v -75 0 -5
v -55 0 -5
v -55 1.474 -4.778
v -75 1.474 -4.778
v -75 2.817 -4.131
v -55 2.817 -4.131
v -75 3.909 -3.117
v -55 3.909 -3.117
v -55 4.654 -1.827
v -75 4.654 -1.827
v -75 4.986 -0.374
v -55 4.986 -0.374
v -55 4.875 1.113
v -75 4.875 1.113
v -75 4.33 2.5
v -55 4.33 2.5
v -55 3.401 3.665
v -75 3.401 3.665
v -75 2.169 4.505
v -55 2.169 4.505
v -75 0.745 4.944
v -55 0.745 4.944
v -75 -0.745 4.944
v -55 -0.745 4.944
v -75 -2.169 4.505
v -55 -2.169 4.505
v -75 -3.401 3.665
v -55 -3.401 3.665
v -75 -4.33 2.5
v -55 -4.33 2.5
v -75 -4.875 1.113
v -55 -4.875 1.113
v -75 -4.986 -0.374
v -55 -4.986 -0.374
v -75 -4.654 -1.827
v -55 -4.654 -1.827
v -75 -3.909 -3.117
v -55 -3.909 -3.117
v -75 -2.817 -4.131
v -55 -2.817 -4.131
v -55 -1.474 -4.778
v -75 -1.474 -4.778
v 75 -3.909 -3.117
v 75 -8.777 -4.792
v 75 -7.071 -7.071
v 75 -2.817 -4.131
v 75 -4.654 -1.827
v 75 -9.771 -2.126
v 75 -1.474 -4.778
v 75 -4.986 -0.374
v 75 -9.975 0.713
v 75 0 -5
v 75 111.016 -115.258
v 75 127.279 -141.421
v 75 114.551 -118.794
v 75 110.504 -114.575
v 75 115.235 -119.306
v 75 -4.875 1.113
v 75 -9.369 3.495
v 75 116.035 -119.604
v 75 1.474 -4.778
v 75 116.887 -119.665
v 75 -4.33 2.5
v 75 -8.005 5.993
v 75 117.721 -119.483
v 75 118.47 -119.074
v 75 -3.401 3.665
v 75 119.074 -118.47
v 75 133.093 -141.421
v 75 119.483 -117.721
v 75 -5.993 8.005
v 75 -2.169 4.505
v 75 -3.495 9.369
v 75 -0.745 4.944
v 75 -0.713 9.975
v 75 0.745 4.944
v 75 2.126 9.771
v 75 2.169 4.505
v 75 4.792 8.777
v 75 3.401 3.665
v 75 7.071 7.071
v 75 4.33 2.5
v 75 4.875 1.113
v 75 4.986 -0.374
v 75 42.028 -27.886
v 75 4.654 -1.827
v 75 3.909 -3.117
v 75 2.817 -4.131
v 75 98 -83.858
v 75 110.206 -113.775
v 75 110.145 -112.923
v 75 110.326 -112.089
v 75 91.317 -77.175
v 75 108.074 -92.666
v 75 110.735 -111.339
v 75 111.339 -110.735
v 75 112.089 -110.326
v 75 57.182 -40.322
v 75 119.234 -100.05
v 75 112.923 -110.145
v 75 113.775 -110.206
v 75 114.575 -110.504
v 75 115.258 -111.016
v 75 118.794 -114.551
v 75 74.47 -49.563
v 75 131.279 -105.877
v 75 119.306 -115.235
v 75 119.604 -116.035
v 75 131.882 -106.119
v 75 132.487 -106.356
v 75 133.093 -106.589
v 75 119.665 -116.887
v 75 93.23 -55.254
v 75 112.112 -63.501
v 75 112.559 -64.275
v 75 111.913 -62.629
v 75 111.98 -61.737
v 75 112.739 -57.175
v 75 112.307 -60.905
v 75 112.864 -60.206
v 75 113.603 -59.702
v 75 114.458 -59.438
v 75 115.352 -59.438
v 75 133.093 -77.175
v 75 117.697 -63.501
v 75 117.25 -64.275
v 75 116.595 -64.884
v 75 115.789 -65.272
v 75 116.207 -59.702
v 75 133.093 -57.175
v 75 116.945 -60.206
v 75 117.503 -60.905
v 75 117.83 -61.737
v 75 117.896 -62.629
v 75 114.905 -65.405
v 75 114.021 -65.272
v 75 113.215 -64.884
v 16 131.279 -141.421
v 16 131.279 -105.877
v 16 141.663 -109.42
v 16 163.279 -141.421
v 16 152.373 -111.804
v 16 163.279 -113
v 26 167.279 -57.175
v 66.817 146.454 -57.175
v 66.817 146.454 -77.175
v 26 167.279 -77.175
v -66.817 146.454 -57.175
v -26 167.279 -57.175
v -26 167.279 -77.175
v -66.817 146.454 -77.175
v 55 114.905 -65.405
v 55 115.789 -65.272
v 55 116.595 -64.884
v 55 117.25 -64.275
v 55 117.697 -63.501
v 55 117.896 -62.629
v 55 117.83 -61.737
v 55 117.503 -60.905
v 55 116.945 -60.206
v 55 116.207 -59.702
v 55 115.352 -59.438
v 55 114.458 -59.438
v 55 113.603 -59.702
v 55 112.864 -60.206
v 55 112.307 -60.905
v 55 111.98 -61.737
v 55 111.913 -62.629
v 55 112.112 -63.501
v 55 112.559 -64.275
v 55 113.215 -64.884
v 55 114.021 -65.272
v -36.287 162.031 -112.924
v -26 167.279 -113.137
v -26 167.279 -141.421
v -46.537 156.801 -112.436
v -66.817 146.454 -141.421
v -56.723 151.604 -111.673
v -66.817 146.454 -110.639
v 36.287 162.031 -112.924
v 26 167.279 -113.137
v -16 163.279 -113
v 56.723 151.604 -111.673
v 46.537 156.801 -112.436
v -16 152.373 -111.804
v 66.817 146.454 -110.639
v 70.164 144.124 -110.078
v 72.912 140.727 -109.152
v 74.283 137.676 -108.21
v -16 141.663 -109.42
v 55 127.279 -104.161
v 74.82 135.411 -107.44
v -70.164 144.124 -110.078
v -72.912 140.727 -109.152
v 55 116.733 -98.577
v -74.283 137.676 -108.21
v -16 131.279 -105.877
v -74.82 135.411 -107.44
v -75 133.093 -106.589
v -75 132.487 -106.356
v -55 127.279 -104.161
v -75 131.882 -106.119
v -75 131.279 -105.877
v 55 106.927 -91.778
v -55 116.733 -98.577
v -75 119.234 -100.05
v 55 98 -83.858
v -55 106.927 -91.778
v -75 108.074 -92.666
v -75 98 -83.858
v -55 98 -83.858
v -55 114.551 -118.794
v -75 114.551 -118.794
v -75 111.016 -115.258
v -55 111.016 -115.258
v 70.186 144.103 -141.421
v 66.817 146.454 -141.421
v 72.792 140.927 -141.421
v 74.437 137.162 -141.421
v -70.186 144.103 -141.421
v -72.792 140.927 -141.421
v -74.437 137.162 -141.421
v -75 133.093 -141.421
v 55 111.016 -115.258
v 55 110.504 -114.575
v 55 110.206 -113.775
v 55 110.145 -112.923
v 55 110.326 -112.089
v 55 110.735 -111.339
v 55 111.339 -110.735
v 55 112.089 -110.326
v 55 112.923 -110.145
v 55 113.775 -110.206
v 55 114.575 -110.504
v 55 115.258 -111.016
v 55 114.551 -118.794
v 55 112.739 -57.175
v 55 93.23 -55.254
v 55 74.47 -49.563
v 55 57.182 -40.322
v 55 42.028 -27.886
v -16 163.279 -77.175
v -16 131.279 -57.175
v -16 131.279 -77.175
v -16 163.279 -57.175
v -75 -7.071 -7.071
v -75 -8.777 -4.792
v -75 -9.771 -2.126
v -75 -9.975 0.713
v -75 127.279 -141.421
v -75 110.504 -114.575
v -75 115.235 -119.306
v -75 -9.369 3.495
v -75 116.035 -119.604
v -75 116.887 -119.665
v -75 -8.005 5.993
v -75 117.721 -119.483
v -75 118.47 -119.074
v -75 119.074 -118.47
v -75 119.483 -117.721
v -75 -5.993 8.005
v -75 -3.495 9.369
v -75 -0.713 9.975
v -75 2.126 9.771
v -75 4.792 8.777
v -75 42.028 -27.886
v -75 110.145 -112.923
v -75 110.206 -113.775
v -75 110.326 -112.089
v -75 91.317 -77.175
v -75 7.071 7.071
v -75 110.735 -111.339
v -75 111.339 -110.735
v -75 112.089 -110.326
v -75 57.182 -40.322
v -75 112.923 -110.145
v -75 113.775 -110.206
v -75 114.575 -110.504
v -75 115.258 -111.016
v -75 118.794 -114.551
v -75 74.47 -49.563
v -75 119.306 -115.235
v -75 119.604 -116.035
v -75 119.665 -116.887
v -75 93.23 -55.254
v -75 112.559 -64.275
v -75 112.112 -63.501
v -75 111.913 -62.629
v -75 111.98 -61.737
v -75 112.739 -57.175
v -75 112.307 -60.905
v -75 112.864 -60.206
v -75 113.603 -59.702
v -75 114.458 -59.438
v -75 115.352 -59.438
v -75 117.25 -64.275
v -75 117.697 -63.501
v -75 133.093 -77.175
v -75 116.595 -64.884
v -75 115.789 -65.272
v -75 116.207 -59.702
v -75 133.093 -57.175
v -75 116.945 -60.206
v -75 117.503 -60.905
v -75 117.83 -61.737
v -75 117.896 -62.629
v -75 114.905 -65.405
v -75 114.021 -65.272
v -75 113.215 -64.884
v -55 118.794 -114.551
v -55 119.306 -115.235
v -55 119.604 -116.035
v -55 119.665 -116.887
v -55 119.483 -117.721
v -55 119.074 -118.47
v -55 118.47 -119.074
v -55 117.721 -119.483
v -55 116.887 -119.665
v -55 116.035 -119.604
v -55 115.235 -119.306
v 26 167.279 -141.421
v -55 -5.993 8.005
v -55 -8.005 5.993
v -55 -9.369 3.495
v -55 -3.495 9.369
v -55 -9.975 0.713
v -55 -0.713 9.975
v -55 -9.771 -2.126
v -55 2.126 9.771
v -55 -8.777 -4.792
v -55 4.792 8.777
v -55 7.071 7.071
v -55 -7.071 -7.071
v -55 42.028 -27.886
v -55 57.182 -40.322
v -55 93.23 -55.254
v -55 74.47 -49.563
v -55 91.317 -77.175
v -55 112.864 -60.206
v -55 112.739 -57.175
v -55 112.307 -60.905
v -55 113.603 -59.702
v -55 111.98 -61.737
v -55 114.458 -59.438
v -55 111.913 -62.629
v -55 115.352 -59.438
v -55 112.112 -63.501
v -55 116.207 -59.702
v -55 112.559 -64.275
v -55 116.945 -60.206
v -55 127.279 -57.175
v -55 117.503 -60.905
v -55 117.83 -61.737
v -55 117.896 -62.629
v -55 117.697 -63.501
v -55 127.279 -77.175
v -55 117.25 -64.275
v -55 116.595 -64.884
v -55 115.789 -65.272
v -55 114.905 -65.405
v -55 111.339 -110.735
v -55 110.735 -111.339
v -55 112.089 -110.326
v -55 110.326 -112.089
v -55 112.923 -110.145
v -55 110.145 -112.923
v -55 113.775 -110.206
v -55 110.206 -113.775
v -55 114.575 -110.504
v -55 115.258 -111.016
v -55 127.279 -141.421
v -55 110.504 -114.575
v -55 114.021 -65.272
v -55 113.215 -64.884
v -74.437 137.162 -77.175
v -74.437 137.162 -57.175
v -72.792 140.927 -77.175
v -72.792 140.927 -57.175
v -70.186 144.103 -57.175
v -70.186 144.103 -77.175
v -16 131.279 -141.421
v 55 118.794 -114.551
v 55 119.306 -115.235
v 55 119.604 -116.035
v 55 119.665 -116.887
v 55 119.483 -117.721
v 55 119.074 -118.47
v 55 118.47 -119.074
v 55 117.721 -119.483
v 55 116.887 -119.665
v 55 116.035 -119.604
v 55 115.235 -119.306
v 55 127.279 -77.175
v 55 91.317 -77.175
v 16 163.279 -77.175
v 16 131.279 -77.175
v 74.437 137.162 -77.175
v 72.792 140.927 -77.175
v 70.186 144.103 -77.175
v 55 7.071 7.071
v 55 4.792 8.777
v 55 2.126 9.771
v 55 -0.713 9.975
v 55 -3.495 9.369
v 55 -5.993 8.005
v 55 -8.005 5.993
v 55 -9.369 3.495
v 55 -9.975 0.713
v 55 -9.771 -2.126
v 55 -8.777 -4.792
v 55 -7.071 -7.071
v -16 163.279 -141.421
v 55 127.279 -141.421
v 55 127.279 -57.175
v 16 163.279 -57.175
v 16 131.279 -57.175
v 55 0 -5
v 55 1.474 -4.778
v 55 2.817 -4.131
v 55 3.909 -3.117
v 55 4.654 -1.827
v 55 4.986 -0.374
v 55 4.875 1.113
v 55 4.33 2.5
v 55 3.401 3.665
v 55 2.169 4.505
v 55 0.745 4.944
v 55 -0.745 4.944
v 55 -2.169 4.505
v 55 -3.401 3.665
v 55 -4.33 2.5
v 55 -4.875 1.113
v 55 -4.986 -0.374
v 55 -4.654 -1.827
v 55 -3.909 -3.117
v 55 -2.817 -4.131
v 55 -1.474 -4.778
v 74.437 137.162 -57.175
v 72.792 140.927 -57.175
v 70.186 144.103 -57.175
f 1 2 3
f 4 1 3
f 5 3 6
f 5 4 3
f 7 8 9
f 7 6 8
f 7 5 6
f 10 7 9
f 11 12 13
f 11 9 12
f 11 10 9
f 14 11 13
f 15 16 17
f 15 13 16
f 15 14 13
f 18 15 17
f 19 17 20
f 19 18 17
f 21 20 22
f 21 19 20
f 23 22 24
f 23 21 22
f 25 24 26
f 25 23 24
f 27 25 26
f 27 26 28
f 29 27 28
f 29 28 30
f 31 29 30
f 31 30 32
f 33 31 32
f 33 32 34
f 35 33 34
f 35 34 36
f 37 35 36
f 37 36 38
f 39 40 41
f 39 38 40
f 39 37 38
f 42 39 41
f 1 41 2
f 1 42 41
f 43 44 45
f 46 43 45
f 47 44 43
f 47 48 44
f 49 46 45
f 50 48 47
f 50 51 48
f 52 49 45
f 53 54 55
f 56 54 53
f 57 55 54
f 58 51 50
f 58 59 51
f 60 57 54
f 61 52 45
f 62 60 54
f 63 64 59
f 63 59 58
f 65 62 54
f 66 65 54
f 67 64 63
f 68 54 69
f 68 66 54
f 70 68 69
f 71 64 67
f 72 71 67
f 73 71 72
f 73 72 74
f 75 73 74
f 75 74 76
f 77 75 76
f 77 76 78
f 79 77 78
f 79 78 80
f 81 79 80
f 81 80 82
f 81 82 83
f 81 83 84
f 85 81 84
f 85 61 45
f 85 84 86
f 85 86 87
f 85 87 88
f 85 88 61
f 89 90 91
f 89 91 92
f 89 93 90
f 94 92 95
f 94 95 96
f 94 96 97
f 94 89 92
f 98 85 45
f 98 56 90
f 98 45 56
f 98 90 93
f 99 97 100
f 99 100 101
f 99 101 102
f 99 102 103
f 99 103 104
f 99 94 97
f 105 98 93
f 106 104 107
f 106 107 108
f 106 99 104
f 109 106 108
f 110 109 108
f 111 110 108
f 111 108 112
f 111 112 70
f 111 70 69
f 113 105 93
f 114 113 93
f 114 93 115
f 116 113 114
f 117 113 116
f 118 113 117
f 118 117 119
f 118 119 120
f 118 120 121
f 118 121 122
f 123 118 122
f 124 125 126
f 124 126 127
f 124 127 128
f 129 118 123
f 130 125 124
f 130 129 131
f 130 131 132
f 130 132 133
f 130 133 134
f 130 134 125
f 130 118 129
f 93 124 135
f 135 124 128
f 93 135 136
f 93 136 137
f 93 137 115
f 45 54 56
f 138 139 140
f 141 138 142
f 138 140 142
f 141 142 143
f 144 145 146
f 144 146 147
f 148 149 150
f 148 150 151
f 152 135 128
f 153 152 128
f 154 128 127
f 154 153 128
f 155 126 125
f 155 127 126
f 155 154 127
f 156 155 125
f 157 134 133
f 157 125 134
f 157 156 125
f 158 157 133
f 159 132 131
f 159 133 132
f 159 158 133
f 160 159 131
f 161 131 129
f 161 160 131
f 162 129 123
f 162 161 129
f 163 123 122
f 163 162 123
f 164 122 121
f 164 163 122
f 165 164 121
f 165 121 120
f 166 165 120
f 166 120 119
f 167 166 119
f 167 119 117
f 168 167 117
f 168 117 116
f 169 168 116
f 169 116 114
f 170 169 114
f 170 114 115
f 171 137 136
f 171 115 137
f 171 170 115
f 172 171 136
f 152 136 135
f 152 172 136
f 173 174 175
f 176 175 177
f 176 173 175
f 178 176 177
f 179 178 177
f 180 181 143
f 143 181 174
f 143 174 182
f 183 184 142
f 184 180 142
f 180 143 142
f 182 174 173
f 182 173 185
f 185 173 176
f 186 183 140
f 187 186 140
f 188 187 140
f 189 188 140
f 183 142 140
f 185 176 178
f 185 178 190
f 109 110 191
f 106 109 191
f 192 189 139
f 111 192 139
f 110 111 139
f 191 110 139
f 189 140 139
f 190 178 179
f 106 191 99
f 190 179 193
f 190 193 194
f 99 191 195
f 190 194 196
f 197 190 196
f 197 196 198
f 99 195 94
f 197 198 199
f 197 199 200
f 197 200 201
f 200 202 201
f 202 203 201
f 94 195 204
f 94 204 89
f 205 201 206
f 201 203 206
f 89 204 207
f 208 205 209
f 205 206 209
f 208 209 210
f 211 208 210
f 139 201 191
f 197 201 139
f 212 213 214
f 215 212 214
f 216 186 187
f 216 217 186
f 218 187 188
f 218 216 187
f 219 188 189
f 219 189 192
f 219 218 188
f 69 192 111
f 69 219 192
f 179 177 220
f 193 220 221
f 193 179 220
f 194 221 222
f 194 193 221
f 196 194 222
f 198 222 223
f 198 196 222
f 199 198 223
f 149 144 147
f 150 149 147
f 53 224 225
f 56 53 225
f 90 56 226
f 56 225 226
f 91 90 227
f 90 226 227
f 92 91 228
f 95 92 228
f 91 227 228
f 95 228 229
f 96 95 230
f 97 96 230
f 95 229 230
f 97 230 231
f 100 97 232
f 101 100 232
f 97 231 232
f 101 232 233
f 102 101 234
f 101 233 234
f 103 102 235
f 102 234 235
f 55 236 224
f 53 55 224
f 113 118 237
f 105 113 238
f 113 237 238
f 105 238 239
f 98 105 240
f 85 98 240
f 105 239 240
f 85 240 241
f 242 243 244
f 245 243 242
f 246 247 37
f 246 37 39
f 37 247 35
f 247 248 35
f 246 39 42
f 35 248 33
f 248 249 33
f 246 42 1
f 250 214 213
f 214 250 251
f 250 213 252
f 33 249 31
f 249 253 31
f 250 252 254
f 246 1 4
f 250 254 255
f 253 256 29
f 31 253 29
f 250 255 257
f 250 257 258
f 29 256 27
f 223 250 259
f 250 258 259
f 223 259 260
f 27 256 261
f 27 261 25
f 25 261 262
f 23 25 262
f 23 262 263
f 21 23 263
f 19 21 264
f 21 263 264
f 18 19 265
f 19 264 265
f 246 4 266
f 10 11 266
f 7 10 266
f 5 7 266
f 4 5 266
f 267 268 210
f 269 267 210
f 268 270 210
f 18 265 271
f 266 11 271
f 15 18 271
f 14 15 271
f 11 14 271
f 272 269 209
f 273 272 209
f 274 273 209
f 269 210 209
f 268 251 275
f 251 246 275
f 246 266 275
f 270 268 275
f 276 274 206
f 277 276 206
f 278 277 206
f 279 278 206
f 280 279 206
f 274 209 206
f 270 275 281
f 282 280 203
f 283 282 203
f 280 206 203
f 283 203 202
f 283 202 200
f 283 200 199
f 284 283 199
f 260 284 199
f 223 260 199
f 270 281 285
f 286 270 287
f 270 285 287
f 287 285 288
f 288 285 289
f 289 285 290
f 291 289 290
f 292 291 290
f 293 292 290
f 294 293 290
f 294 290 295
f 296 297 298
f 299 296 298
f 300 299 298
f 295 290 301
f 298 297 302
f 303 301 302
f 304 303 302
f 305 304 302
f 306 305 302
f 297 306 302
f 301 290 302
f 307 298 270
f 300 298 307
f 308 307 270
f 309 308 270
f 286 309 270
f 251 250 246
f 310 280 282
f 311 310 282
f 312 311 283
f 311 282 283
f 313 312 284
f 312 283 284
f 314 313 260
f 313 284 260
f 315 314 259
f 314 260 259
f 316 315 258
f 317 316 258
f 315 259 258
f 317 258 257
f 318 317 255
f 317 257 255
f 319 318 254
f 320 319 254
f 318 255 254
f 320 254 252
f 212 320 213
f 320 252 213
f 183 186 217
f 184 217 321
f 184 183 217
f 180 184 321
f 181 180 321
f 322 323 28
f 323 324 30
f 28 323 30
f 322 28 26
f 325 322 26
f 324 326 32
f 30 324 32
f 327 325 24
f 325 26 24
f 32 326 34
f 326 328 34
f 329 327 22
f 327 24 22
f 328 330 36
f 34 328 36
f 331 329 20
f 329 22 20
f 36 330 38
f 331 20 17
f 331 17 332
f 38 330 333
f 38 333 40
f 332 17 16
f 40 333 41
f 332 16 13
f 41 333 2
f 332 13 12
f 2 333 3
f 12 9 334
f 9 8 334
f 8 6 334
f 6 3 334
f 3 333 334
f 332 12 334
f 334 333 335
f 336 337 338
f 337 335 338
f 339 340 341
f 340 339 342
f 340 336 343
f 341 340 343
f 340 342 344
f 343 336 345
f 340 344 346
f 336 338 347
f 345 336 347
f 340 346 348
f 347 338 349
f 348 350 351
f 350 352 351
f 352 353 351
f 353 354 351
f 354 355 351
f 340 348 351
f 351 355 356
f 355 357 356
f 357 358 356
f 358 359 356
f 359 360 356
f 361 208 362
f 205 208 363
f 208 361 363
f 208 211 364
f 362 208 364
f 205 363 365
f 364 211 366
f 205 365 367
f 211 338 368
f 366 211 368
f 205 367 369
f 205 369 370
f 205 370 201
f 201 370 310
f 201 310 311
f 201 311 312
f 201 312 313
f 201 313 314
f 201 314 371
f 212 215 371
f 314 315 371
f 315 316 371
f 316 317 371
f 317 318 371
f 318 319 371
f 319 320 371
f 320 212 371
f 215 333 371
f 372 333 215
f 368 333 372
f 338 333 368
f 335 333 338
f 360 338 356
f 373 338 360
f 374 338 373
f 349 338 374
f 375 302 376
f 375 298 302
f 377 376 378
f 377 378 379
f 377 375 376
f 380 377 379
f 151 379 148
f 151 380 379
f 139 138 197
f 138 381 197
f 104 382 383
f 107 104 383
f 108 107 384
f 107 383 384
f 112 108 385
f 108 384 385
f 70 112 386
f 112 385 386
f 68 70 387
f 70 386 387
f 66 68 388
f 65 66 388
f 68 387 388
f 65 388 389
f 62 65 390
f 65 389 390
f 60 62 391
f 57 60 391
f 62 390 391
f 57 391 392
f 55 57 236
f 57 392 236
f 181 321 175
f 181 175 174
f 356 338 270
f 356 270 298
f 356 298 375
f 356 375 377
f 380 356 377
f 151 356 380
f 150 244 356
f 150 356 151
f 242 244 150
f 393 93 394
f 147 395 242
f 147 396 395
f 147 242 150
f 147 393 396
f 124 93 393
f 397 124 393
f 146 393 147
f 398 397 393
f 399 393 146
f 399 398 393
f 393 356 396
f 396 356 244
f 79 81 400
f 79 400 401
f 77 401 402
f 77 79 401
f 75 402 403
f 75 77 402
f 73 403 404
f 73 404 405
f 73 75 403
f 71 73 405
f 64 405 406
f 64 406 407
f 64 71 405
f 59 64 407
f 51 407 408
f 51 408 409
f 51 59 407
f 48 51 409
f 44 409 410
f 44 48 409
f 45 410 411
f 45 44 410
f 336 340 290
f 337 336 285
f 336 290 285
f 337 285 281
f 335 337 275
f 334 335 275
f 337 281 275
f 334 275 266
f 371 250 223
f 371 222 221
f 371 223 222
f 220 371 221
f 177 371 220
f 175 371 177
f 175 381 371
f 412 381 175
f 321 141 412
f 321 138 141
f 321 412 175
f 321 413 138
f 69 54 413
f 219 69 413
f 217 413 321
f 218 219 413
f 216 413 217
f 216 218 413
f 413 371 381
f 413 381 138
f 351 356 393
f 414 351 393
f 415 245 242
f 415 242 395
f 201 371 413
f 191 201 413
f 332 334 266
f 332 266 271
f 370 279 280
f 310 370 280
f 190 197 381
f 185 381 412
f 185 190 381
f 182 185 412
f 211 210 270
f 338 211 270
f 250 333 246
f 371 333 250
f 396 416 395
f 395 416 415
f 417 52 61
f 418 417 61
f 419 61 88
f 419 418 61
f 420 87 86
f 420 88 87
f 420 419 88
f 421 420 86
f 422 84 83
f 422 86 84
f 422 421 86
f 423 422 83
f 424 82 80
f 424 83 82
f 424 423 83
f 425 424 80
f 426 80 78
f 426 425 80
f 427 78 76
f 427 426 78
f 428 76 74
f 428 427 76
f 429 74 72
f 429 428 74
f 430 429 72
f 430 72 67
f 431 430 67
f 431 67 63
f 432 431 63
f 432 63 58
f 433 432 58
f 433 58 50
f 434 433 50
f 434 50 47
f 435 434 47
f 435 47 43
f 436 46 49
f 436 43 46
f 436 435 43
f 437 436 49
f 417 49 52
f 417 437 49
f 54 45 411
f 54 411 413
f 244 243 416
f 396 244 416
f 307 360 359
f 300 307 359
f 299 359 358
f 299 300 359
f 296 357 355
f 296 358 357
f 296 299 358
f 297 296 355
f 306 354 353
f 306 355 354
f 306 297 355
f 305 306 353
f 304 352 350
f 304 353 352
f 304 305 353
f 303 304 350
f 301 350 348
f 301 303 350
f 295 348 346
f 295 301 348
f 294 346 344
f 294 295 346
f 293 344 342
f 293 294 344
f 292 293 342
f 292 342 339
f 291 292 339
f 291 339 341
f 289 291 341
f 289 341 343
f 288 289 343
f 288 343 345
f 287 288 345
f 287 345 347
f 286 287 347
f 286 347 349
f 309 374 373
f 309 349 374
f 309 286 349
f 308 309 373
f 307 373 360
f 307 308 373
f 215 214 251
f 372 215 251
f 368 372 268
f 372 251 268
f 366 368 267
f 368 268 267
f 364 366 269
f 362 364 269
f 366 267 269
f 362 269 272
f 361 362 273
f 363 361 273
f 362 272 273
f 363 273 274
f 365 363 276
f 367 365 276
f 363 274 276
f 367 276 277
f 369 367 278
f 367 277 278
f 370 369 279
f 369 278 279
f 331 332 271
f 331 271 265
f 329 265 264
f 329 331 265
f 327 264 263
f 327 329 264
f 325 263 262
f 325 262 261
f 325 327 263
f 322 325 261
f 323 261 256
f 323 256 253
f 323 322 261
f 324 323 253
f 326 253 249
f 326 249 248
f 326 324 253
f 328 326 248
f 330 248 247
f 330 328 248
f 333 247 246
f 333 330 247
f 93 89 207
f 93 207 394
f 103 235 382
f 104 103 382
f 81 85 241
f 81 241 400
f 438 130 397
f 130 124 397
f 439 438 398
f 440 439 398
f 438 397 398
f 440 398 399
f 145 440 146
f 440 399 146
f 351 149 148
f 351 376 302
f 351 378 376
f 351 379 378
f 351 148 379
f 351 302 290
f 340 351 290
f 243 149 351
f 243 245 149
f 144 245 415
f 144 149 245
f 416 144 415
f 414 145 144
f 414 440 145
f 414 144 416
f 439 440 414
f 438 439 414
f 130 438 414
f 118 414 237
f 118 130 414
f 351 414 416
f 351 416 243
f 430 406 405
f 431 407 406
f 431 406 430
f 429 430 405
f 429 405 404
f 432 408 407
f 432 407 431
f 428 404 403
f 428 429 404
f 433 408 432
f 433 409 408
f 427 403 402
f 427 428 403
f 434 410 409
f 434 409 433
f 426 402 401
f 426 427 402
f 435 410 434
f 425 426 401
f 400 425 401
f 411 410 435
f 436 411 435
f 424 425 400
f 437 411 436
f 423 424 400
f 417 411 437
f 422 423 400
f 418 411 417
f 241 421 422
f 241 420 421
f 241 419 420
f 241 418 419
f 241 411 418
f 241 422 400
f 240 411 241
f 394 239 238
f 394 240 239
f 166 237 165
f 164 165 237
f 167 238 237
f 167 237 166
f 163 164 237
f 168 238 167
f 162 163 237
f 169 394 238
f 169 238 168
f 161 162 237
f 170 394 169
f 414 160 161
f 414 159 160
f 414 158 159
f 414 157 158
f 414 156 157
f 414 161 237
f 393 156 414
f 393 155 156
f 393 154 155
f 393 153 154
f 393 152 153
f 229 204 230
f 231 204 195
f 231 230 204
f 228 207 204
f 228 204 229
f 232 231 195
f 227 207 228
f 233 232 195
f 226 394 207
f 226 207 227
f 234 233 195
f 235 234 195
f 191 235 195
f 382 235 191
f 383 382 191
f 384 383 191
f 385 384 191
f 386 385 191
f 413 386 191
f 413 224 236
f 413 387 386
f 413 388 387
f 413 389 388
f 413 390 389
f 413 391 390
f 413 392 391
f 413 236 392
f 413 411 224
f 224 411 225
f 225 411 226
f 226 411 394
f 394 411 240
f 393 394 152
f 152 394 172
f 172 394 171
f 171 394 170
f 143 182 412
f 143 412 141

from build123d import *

# Parameters (mm, degrees)
BOSS_EXTRUDE1_DEPTH     = 75
BOSS_EXTRUDE2_DEPTH     = 75
SKETCH6_W               = 32
SKETCH6_H               = 32
CUT_EXTRUDE1_DEPTH      = 232.532584422
FILLET1_START           = -75
FILLET1_DEPTH           = 150
FILLET1_START_2         = -40.56574
FILLET1_2_DEPTH         = 24.56574
FILLET1_START_3         = 16
FILLET1_3_DEPTH         = 10
FILLET1_START_4         = -26
FILLET1_4_DEPTH         = 101
FILLET1_5_DEPTH         = 34.43426
FILLET1_START_5         = -113.13708499
FILLET1_6_OUTLINE_W     = 32
FILLET1_6_OUTLINE_H     = 32
FILLET1_6_DEPTH         = 29.279073903
CUT_EXTRUDE3_DEPTH      = 232.532584422
CUT_EXTRUDE3_DEPTH_BACK = 232.532584422
SKETCH10_W              = 110
SKETCH10_H              = 254.558441228
CUT_EXTRUDE4_DEPTH      = 232.532584422
CUT_EXTRUDE4_DEPTH_BACK = 232.532584422
SKETCH11_R              = 5
SKETCH11_R_2            = 3
FILLET2_R               = 15


with BuildPart() as part:
    # Sketch3 → Boss-Extrude1 (new, symmetric)
    with BuildSketch(Plane(origin=(0, 0, 0), x_dir=(0, 0, -1), z_dir=(1, 0, 0))):
        with BuildLine():
            Line((7.071067812, -7.071067812), (141.421356237, 127.279220614))
            Line((141.421356237, 127.279220614), (141.421356237, 167.279220614))
            Line((141.421356237, 167.279220614), (113.13708499, 167.279220614))
            Line((113.13708499, 167.279220614), (113.13708499, 127.279220614))
            Line((113.13708499, 127.279220614), (-7.071067812, 7.071067812))
            ThreePointArc((-7.071067812, 7.071067812), (-7.071067812, -7.071067812), (7.071067812, -7.071067812))
        make_face()
    extrude(amount=BOSS_EXTRUDE1_DEPTH, both=True)

    # Sketch9 → Boss-Extrude2 (add, symmetric)
    with BuildSketch(Plane(origin=(0, 0, 0), x_dir=(0, 0, -1), z_dir=(1, 0, 0))):
        Polygon((57.175144213, 127.279220614), (57.175144213, 167.279220614), (77.175144213, 167.279220614), (77.175144213, 127.279220614), (77.175144213, 91.317279836), (57.175144213, 71.317279836), align=None)
    extrude(amount=BOSS_EXTRUDE2_DEPTH, both=True)

    # Sketch6 → Cut-Extrude1 (cut, through all)
    with BuildSketch(Plane.XY):
        with Locations((0, 147.279220614)):
            Rectangle(SKETCH6_W, SKETCH6_H)
        Polygon((-26, 167.279220614), (-75, 142.279220614), (-75, 167.279220614), align=None)
        Polygon((26, 167.279220614), (75, 167.279220614), (75, 142.279220614), align=None)
    extrude(amount=-CUT_EXTRUDE1_DEPTH, mode=Mode.SUBTRACT)

    # Fillet1: read off the stored shape, not the designer's step
    # Fillet1 outline → Fillet1 (add)
    with BuildSketch(Plane.YZ.offset(FILLET1_START)):
        with BuildLine():
            Line((131.279220614, -113.13708499), (131.279220614, -105.877452163))
            ThreePointArc((131.279220614, -105.877452163), (113.530191873, -96.544561619), (98.00014671, -83.858011087))
            Line((98.00014671, -83.858011087), (127.279220614, -113.13708499))
            Line((127.279220614, -113.13708499), (131.279220614, -113.13708499))
        make_face()
        with BuildLine():
            Line((71.317279836, -57.175144213), (112.738636074, -57.175144213))
            ThreePointArc((112.738636074, -57.175144213), (74.470292837, -49.563097464), (42.027957955, -27.885822331))
            Line((42.027957955, -27.885822331), (71.317279836, -57.175144213))
        make_face()
    extrude(amount=FILLET1_DEPTH)

    # Fillet1 2 outline → Fillet1 2 (add)
    with BuildSketch(Plane.YZ.offset(FILLET1_START_2)):
        with BuildLine():
            ThreePointArc((167.279220614, -113.13708499), (148.943103424, -111.174049686), (131.279220614, -105.877452163))
            Line((131.279220614, -105.877452163), (131.279220614, -113.13708499))
            Line((131.279220614, -113.13708499), (167.279220614, -113.13708499))
        make_face()
    extrude(amount=FILLET1_2_DEPTH)

    # Fillet1 3 outline → Fillet1 3 (add)
    with BuildSketch(Plane.YZ.offset(FILLET1_START_3)):
        with BuildLine():
            ThreePointArc((167.279220614, -113.13708499), (148.943103424, -111.174049686), (131.279220614, -105.877452163))
            Line((131.279220614, -105.877452163), (131.279220614, -113.13708499))
            Line((131.279220614, -113.13708499), (167.279220614, -113.13708499))
        make_face()
    extrude(amount=FILLET1_3_DEPTH)

    # Fillet1 4 outline → Fillet1 4 (add)
    with BuildSketch(Plane.YZ.offset(FILLET1_START_4)):
        with BuildLine():
            Line((131.279220614, -113.13708499), (167.279220614, -113.13708499))
            ThreePointArc((167.279220614, -113.13708499), (148.943103424, -111.174049686), (131.279220614, -105.877452163))
            Line((131.279220614, -105.877452163), (131.279220614, -113.13708499))
        make_face()
    extrude(amount=FILLET1_4_DEPTH)

    # Fillet1 5 outline → Fillet1 5 (add)
    with BuildSketch(Plane.YZ.offset(FILLET1_START)):
        with BuildLine():
            Line((131.279220614, -113.13708499), (167.279220614, -113.13708499))
            ThreePointArc((167.279220614, -113.13708499), (148.943103424, -111.174049686), (131.279220614, -105.877452163))
            Line((131.279220614, -105.877452163), (131.279220614, -113.13708499))
        make_face()
    extrude(amount=FILLET1_5_DEPTH)

    # Fillet1 6 outline → Fillet1 6 (cut)
    with BuildSketch(Plane.XY.offset(FILLET1_START_5)):
        Polygon((75, 167.279220614), (26, 167.279220614), (75, 142.279220614), align=None)
        Polygon((-26, 167.279220614), (-75, 167.279220614), (-75, 142.279220614), align=None)
        with Locations((0, 147.279220614)):
            Rectangle(FILLET1_6_OUTLINE_W, FILLET1_6_OUTLINE_H)
    extrude(amount=FILLET1_6_DEPTH, mode=Mode.SUBTRACT)

    # Sketch10 → Cut-Extrude3 (cut, two sides: drawn at the far end of the back side and taken through both)
    with BuildSketch(Plane.XY.offset(-CUT_EXTRUDE3_DEPTH_BACK)):
        Rectangle(SKETCH10_W, SKETCH10_H)
    extrude(amount=CUT_EXTRUDE3_DEPTH + CUT_EXTRUDE3_DEPTH_BACK, mode=Mode.SUBTRACT)

    # Sketch11 → Cut-Extrude4 (cut, two sides: drawn at the far end of the back side and taken through both)
    with BuildSketch(Plane(origin=(0, 0, 0), x_dir=(0, 0, -1), z_dir=(1, 0, 0)).offset(-CUT_EXTRUDE4_DEPTH_BACK)):
        Circle(SKETCH11_R)
        with Locations((62.404851943, 114.904851943)):
            Circle(SKETCH11_R_2)
        with BuildLine():
            Line((118.793939239, 114.551298552), (115.258405333, 111.015764646))
            ThreePointArc((115.258405333, 111.015764646), (111.015764646, 111.015764646), (111.015764646, 115.258405333))
            Line((111.015764646, 115.258405333), (114.551298552, 118.793939239))
            ThreePointArc((114.551298552, 118.793939239), (118.793939239, 118.793939239), (118.793939239, 114.551298552))
        make_face()
    extrude(amount=CUT_EXTRUDE4_DEPTH + CUT_EXTRUDE4_DEPTH_BACK, mode=Mode.SUBTRACT)

    # Fillet2
    fillet2_edges = [part.edges().sort_by_distance(p)[0] for p in [
        (75, 142.279220614, -127.279220614),
        (75, 142.279220614, -67.175144213),
        (-75, 142.279220614, -127.279220614),
        (-75, 142.279220614, -67.175144213),
    ]]
    fillet(fillet2_edges, radius=FILLET2_R)


solid = part.part
